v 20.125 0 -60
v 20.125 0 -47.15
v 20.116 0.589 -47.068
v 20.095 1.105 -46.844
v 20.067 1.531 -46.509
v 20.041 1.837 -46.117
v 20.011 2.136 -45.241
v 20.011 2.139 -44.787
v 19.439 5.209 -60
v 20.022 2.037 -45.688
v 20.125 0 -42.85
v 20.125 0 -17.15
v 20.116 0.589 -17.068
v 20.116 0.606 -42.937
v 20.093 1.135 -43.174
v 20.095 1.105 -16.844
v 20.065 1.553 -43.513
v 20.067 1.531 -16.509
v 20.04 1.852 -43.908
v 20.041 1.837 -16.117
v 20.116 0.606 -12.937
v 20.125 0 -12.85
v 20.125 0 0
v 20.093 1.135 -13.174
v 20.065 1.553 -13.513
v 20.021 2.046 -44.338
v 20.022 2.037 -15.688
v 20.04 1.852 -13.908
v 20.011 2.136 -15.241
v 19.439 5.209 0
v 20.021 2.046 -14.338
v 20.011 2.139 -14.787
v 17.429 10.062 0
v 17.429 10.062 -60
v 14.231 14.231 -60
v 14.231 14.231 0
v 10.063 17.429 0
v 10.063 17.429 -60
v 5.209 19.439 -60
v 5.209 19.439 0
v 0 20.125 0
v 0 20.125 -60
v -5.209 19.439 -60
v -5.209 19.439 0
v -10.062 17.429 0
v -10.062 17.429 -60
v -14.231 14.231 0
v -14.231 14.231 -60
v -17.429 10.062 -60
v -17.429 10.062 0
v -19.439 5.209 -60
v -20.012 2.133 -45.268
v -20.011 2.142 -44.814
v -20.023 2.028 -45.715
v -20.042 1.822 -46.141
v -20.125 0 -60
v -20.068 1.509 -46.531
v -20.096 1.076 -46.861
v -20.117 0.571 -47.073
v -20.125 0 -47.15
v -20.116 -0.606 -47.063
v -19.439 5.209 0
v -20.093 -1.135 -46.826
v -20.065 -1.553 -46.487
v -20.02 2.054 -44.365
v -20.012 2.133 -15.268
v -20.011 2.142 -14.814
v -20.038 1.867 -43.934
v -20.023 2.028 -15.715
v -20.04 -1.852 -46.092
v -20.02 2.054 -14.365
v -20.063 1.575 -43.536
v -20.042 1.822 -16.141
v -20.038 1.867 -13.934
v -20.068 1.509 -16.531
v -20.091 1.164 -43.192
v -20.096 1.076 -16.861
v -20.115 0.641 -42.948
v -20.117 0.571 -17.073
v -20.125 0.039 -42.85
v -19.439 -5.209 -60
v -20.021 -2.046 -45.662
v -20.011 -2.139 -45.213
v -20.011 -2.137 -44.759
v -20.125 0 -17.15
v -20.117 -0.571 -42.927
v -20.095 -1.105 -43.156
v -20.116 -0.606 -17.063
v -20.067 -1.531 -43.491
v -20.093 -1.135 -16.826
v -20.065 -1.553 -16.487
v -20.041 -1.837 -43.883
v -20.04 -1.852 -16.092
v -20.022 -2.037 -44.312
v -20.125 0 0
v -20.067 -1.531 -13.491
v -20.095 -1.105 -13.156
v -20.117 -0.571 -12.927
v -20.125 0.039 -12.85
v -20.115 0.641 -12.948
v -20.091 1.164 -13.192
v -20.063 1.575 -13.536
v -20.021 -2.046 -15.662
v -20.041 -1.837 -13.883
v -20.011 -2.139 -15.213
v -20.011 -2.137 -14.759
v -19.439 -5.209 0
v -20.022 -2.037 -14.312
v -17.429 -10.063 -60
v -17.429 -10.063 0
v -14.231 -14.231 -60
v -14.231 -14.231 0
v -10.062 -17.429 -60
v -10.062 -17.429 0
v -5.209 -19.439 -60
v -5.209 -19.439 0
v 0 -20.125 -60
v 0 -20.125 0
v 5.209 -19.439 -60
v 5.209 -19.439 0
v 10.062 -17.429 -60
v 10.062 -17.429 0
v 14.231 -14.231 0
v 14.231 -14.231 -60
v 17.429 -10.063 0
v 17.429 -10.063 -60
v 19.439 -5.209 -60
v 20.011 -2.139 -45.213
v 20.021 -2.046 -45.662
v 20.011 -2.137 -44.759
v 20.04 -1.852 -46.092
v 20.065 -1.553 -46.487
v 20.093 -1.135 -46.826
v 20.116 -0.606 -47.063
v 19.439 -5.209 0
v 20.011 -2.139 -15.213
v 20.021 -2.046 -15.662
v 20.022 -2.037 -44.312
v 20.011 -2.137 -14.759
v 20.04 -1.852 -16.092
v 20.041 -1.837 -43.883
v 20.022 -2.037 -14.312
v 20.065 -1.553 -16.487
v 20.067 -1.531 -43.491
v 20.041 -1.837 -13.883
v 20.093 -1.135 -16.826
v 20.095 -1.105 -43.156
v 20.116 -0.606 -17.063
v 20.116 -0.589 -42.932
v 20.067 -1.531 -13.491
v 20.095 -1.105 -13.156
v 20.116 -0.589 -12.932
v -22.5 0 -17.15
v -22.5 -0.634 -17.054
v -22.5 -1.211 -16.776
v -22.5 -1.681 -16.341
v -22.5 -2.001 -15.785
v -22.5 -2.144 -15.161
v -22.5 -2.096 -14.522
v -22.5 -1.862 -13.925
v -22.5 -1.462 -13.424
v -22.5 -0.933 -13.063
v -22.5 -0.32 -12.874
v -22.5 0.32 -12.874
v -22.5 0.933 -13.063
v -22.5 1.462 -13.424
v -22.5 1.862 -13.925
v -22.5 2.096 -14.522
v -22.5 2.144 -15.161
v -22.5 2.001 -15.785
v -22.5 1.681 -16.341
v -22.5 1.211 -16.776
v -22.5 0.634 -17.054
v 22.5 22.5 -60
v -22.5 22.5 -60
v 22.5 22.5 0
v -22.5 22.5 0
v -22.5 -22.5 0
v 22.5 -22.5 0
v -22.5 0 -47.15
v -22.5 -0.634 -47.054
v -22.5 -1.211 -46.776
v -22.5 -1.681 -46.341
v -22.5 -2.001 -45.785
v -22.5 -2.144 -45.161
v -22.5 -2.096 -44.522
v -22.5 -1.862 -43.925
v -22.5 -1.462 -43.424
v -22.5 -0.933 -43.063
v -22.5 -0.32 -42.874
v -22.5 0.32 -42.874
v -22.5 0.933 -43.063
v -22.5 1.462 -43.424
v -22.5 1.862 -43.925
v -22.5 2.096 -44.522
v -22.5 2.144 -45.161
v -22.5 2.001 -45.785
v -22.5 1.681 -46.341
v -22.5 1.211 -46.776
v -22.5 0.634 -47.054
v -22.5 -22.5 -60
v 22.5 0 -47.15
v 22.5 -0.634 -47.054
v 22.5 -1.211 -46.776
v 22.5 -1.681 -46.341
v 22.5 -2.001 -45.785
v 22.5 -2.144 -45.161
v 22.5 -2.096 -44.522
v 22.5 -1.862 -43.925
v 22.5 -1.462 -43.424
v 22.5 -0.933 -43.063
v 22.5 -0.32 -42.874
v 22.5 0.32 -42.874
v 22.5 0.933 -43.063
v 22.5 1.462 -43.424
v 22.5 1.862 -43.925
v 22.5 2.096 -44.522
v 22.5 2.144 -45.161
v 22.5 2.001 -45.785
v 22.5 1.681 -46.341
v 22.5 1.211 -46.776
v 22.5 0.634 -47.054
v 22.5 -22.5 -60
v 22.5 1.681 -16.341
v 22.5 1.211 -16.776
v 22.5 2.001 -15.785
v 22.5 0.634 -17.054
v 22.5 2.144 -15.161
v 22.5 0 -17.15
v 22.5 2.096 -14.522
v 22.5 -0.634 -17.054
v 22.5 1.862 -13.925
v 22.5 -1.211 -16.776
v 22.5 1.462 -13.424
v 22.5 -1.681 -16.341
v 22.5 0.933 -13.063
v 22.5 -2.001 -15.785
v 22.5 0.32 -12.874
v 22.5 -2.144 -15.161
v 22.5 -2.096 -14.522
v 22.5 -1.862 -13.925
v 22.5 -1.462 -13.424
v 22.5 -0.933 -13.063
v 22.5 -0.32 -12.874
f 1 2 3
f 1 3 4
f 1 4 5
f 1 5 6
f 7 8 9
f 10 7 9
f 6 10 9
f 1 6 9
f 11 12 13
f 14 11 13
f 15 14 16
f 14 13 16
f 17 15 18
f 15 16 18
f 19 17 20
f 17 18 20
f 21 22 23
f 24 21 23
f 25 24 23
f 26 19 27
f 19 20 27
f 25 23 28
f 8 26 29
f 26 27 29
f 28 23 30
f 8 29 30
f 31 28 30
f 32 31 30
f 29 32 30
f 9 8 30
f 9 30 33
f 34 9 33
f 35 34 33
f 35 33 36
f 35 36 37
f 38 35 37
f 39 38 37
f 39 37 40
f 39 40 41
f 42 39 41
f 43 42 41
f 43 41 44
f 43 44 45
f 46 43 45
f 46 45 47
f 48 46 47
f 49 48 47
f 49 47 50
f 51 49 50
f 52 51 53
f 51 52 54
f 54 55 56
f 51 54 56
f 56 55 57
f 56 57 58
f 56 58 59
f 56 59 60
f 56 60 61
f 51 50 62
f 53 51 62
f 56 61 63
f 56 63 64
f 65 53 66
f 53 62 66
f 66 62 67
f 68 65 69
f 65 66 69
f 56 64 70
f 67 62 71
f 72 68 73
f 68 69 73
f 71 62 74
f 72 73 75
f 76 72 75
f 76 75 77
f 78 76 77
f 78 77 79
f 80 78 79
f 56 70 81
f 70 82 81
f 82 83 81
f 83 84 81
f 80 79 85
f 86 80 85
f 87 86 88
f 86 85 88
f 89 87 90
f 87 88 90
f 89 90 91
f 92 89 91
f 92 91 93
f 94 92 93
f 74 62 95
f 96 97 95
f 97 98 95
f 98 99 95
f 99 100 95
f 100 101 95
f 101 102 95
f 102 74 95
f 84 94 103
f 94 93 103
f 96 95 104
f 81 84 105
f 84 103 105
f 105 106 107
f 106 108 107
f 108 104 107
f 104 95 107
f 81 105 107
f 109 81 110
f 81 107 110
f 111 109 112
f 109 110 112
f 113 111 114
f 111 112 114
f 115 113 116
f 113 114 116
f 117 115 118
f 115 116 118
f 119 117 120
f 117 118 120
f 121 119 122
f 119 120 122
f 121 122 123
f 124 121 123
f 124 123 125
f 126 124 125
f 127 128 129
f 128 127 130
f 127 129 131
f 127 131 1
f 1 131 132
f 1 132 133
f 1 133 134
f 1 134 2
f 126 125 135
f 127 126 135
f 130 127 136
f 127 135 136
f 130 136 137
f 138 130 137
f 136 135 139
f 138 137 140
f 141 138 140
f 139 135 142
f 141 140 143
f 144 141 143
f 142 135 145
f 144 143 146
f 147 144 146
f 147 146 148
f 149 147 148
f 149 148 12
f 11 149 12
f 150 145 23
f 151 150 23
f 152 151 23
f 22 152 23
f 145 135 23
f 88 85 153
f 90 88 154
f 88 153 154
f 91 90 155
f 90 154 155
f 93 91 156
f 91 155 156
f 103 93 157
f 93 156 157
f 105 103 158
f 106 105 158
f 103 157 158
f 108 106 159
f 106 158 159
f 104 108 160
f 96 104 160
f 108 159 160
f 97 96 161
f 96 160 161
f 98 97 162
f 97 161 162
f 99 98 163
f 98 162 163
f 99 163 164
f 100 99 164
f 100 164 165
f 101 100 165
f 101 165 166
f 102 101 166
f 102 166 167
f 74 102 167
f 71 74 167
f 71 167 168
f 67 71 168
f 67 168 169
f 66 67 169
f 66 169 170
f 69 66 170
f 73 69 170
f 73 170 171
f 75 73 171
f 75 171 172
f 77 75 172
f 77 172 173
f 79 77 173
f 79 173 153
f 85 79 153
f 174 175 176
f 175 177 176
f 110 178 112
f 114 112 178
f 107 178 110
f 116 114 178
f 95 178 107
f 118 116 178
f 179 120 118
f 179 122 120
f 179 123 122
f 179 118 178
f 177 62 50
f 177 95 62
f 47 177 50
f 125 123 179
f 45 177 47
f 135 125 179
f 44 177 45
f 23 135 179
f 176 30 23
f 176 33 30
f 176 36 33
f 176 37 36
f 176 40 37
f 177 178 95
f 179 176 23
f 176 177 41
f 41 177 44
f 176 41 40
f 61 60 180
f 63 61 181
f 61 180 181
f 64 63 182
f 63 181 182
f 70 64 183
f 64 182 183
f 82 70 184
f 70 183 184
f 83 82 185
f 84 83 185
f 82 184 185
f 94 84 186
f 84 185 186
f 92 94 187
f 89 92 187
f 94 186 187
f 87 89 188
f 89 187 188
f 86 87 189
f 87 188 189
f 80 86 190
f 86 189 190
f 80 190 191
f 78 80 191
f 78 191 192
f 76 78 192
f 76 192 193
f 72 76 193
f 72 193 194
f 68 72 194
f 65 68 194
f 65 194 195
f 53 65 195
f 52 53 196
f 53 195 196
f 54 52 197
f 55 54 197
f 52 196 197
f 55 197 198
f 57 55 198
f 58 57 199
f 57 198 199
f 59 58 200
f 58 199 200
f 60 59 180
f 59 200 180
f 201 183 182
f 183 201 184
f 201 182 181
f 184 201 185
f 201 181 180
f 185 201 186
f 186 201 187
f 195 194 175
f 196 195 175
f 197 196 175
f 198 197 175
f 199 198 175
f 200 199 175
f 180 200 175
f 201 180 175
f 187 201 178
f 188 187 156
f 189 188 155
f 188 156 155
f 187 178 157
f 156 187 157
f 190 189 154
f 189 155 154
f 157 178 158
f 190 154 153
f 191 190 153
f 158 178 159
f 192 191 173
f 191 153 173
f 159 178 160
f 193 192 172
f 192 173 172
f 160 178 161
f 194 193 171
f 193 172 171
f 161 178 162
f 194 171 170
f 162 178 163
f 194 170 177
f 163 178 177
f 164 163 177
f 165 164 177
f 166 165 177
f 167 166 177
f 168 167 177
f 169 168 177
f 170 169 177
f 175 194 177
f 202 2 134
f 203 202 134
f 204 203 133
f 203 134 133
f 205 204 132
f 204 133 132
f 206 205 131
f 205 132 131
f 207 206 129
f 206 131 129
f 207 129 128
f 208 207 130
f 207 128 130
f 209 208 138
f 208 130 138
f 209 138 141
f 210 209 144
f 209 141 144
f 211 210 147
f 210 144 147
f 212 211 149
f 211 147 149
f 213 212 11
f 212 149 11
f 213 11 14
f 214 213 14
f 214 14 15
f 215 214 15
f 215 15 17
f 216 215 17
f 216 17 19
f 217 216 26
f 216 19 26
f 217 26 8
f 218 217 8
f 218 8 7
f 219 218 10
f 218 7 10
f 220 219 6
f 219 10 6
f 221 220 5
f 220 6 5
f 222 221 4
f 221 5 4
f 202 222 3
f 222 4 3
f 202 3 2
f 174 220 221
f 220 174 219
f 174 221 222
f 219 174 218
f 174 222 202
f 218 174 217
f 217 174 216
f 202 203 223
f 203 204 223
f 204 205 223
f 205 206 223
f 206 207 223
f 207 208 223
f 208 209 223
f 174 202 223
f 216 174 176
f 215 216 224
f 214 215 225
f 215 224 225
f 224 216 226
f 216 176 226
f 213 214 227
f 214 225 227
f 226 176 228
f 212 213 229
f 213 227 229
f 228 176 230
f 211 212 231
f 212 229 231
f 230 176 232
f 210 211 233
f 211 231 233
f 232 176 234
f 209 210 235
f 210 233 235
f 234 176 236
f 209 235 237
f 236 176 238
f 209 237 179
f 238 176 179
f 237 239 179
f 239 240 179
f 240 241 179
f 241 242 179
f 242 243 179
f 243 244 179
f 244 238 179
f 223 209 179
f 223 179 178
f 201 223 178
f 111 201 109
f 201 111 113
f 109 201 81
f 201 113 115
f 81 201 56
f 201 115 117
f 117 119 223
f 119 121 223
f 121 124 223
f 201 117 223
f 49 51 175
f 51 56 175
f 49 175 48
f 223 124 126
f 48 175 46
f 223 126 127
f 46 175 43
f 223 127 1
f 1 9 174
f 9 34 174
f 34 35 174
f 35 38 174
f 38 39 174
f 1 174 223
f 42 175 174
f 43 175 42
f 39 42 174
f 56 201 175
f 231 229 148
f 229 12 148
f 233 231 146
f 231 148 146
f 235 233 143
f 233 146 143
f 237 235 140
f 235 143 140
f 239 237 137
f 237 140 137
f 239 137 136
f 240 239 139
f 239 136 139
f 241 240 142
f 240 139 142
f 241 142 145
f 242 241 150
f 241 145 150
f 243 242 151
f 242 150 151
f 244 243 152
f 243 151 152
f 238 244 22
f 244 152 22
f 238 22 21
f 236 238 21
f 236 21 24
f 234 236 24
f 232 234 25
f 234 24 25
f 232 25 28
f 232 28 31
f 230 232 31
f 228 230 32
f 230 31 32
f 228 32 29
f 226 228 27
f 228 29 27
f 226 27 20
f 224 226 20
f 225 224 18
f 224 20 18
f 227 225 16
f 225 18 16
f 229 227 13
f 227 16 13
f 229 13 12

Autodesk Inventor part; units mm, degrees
ref_plane "YZ Plane" through (0, 0, 0) normal (1, 0, 0) x (0, 1, 0)
ref_plane "XZ Plane" through (0, 0, 0) normal (0, 1, 0) x (-1, 0, 0)
ref_plane "XY Plane" through (0, 0, 0) normal (0, 0, 1) x (1, 0, 0)
sketch "Sketch1" plane through (0, 0, 0) normal (1, 0, 0) x (0, 1, 0)
  line L0 (0, 0) -> (0, -15)
  line L1 (0, -15) -> (0, -45)
  line L2 (0, -45) -> (0, -60)
  dimension "d0" = 15
  dimension "d2" = 30
  dimension "d3" = 15
sketch "Sketch2" plane through (0, 0, 0) normal (0, 0, 1) x (1, 0, 0)
  line L0 (-22.5, 22.5) -> (22.5, 22.5)
  line L1 (22.5, 22.5) -> (22.5, -22.5)
  line L2 (22.5, -22.5) -> (-22.5, -22.5)
  line L3 (-22.5, -22.5) -> (-22.5, 22.5)
  line L4 (-22.5, 22.5) -> (22.5, -22.5) construction
  line L5 (22.5, 22.5) -> (-22.5, -22.5) construction
  circle A0 centre (0, 0) radius 20.125
  dimension "d6" = 45
  dimension "d7" = 45
  dimension "d8" = 40.25
extrude "Extrusion1" add sketch "Sketch2" against normal blind 60
hole "Hole1" at (0, 0, -15) at (0, 0, -45) direction (-1, 0, 0) diameter 4.3 end through all both
properties part number "Bohrschablone_Oben"
